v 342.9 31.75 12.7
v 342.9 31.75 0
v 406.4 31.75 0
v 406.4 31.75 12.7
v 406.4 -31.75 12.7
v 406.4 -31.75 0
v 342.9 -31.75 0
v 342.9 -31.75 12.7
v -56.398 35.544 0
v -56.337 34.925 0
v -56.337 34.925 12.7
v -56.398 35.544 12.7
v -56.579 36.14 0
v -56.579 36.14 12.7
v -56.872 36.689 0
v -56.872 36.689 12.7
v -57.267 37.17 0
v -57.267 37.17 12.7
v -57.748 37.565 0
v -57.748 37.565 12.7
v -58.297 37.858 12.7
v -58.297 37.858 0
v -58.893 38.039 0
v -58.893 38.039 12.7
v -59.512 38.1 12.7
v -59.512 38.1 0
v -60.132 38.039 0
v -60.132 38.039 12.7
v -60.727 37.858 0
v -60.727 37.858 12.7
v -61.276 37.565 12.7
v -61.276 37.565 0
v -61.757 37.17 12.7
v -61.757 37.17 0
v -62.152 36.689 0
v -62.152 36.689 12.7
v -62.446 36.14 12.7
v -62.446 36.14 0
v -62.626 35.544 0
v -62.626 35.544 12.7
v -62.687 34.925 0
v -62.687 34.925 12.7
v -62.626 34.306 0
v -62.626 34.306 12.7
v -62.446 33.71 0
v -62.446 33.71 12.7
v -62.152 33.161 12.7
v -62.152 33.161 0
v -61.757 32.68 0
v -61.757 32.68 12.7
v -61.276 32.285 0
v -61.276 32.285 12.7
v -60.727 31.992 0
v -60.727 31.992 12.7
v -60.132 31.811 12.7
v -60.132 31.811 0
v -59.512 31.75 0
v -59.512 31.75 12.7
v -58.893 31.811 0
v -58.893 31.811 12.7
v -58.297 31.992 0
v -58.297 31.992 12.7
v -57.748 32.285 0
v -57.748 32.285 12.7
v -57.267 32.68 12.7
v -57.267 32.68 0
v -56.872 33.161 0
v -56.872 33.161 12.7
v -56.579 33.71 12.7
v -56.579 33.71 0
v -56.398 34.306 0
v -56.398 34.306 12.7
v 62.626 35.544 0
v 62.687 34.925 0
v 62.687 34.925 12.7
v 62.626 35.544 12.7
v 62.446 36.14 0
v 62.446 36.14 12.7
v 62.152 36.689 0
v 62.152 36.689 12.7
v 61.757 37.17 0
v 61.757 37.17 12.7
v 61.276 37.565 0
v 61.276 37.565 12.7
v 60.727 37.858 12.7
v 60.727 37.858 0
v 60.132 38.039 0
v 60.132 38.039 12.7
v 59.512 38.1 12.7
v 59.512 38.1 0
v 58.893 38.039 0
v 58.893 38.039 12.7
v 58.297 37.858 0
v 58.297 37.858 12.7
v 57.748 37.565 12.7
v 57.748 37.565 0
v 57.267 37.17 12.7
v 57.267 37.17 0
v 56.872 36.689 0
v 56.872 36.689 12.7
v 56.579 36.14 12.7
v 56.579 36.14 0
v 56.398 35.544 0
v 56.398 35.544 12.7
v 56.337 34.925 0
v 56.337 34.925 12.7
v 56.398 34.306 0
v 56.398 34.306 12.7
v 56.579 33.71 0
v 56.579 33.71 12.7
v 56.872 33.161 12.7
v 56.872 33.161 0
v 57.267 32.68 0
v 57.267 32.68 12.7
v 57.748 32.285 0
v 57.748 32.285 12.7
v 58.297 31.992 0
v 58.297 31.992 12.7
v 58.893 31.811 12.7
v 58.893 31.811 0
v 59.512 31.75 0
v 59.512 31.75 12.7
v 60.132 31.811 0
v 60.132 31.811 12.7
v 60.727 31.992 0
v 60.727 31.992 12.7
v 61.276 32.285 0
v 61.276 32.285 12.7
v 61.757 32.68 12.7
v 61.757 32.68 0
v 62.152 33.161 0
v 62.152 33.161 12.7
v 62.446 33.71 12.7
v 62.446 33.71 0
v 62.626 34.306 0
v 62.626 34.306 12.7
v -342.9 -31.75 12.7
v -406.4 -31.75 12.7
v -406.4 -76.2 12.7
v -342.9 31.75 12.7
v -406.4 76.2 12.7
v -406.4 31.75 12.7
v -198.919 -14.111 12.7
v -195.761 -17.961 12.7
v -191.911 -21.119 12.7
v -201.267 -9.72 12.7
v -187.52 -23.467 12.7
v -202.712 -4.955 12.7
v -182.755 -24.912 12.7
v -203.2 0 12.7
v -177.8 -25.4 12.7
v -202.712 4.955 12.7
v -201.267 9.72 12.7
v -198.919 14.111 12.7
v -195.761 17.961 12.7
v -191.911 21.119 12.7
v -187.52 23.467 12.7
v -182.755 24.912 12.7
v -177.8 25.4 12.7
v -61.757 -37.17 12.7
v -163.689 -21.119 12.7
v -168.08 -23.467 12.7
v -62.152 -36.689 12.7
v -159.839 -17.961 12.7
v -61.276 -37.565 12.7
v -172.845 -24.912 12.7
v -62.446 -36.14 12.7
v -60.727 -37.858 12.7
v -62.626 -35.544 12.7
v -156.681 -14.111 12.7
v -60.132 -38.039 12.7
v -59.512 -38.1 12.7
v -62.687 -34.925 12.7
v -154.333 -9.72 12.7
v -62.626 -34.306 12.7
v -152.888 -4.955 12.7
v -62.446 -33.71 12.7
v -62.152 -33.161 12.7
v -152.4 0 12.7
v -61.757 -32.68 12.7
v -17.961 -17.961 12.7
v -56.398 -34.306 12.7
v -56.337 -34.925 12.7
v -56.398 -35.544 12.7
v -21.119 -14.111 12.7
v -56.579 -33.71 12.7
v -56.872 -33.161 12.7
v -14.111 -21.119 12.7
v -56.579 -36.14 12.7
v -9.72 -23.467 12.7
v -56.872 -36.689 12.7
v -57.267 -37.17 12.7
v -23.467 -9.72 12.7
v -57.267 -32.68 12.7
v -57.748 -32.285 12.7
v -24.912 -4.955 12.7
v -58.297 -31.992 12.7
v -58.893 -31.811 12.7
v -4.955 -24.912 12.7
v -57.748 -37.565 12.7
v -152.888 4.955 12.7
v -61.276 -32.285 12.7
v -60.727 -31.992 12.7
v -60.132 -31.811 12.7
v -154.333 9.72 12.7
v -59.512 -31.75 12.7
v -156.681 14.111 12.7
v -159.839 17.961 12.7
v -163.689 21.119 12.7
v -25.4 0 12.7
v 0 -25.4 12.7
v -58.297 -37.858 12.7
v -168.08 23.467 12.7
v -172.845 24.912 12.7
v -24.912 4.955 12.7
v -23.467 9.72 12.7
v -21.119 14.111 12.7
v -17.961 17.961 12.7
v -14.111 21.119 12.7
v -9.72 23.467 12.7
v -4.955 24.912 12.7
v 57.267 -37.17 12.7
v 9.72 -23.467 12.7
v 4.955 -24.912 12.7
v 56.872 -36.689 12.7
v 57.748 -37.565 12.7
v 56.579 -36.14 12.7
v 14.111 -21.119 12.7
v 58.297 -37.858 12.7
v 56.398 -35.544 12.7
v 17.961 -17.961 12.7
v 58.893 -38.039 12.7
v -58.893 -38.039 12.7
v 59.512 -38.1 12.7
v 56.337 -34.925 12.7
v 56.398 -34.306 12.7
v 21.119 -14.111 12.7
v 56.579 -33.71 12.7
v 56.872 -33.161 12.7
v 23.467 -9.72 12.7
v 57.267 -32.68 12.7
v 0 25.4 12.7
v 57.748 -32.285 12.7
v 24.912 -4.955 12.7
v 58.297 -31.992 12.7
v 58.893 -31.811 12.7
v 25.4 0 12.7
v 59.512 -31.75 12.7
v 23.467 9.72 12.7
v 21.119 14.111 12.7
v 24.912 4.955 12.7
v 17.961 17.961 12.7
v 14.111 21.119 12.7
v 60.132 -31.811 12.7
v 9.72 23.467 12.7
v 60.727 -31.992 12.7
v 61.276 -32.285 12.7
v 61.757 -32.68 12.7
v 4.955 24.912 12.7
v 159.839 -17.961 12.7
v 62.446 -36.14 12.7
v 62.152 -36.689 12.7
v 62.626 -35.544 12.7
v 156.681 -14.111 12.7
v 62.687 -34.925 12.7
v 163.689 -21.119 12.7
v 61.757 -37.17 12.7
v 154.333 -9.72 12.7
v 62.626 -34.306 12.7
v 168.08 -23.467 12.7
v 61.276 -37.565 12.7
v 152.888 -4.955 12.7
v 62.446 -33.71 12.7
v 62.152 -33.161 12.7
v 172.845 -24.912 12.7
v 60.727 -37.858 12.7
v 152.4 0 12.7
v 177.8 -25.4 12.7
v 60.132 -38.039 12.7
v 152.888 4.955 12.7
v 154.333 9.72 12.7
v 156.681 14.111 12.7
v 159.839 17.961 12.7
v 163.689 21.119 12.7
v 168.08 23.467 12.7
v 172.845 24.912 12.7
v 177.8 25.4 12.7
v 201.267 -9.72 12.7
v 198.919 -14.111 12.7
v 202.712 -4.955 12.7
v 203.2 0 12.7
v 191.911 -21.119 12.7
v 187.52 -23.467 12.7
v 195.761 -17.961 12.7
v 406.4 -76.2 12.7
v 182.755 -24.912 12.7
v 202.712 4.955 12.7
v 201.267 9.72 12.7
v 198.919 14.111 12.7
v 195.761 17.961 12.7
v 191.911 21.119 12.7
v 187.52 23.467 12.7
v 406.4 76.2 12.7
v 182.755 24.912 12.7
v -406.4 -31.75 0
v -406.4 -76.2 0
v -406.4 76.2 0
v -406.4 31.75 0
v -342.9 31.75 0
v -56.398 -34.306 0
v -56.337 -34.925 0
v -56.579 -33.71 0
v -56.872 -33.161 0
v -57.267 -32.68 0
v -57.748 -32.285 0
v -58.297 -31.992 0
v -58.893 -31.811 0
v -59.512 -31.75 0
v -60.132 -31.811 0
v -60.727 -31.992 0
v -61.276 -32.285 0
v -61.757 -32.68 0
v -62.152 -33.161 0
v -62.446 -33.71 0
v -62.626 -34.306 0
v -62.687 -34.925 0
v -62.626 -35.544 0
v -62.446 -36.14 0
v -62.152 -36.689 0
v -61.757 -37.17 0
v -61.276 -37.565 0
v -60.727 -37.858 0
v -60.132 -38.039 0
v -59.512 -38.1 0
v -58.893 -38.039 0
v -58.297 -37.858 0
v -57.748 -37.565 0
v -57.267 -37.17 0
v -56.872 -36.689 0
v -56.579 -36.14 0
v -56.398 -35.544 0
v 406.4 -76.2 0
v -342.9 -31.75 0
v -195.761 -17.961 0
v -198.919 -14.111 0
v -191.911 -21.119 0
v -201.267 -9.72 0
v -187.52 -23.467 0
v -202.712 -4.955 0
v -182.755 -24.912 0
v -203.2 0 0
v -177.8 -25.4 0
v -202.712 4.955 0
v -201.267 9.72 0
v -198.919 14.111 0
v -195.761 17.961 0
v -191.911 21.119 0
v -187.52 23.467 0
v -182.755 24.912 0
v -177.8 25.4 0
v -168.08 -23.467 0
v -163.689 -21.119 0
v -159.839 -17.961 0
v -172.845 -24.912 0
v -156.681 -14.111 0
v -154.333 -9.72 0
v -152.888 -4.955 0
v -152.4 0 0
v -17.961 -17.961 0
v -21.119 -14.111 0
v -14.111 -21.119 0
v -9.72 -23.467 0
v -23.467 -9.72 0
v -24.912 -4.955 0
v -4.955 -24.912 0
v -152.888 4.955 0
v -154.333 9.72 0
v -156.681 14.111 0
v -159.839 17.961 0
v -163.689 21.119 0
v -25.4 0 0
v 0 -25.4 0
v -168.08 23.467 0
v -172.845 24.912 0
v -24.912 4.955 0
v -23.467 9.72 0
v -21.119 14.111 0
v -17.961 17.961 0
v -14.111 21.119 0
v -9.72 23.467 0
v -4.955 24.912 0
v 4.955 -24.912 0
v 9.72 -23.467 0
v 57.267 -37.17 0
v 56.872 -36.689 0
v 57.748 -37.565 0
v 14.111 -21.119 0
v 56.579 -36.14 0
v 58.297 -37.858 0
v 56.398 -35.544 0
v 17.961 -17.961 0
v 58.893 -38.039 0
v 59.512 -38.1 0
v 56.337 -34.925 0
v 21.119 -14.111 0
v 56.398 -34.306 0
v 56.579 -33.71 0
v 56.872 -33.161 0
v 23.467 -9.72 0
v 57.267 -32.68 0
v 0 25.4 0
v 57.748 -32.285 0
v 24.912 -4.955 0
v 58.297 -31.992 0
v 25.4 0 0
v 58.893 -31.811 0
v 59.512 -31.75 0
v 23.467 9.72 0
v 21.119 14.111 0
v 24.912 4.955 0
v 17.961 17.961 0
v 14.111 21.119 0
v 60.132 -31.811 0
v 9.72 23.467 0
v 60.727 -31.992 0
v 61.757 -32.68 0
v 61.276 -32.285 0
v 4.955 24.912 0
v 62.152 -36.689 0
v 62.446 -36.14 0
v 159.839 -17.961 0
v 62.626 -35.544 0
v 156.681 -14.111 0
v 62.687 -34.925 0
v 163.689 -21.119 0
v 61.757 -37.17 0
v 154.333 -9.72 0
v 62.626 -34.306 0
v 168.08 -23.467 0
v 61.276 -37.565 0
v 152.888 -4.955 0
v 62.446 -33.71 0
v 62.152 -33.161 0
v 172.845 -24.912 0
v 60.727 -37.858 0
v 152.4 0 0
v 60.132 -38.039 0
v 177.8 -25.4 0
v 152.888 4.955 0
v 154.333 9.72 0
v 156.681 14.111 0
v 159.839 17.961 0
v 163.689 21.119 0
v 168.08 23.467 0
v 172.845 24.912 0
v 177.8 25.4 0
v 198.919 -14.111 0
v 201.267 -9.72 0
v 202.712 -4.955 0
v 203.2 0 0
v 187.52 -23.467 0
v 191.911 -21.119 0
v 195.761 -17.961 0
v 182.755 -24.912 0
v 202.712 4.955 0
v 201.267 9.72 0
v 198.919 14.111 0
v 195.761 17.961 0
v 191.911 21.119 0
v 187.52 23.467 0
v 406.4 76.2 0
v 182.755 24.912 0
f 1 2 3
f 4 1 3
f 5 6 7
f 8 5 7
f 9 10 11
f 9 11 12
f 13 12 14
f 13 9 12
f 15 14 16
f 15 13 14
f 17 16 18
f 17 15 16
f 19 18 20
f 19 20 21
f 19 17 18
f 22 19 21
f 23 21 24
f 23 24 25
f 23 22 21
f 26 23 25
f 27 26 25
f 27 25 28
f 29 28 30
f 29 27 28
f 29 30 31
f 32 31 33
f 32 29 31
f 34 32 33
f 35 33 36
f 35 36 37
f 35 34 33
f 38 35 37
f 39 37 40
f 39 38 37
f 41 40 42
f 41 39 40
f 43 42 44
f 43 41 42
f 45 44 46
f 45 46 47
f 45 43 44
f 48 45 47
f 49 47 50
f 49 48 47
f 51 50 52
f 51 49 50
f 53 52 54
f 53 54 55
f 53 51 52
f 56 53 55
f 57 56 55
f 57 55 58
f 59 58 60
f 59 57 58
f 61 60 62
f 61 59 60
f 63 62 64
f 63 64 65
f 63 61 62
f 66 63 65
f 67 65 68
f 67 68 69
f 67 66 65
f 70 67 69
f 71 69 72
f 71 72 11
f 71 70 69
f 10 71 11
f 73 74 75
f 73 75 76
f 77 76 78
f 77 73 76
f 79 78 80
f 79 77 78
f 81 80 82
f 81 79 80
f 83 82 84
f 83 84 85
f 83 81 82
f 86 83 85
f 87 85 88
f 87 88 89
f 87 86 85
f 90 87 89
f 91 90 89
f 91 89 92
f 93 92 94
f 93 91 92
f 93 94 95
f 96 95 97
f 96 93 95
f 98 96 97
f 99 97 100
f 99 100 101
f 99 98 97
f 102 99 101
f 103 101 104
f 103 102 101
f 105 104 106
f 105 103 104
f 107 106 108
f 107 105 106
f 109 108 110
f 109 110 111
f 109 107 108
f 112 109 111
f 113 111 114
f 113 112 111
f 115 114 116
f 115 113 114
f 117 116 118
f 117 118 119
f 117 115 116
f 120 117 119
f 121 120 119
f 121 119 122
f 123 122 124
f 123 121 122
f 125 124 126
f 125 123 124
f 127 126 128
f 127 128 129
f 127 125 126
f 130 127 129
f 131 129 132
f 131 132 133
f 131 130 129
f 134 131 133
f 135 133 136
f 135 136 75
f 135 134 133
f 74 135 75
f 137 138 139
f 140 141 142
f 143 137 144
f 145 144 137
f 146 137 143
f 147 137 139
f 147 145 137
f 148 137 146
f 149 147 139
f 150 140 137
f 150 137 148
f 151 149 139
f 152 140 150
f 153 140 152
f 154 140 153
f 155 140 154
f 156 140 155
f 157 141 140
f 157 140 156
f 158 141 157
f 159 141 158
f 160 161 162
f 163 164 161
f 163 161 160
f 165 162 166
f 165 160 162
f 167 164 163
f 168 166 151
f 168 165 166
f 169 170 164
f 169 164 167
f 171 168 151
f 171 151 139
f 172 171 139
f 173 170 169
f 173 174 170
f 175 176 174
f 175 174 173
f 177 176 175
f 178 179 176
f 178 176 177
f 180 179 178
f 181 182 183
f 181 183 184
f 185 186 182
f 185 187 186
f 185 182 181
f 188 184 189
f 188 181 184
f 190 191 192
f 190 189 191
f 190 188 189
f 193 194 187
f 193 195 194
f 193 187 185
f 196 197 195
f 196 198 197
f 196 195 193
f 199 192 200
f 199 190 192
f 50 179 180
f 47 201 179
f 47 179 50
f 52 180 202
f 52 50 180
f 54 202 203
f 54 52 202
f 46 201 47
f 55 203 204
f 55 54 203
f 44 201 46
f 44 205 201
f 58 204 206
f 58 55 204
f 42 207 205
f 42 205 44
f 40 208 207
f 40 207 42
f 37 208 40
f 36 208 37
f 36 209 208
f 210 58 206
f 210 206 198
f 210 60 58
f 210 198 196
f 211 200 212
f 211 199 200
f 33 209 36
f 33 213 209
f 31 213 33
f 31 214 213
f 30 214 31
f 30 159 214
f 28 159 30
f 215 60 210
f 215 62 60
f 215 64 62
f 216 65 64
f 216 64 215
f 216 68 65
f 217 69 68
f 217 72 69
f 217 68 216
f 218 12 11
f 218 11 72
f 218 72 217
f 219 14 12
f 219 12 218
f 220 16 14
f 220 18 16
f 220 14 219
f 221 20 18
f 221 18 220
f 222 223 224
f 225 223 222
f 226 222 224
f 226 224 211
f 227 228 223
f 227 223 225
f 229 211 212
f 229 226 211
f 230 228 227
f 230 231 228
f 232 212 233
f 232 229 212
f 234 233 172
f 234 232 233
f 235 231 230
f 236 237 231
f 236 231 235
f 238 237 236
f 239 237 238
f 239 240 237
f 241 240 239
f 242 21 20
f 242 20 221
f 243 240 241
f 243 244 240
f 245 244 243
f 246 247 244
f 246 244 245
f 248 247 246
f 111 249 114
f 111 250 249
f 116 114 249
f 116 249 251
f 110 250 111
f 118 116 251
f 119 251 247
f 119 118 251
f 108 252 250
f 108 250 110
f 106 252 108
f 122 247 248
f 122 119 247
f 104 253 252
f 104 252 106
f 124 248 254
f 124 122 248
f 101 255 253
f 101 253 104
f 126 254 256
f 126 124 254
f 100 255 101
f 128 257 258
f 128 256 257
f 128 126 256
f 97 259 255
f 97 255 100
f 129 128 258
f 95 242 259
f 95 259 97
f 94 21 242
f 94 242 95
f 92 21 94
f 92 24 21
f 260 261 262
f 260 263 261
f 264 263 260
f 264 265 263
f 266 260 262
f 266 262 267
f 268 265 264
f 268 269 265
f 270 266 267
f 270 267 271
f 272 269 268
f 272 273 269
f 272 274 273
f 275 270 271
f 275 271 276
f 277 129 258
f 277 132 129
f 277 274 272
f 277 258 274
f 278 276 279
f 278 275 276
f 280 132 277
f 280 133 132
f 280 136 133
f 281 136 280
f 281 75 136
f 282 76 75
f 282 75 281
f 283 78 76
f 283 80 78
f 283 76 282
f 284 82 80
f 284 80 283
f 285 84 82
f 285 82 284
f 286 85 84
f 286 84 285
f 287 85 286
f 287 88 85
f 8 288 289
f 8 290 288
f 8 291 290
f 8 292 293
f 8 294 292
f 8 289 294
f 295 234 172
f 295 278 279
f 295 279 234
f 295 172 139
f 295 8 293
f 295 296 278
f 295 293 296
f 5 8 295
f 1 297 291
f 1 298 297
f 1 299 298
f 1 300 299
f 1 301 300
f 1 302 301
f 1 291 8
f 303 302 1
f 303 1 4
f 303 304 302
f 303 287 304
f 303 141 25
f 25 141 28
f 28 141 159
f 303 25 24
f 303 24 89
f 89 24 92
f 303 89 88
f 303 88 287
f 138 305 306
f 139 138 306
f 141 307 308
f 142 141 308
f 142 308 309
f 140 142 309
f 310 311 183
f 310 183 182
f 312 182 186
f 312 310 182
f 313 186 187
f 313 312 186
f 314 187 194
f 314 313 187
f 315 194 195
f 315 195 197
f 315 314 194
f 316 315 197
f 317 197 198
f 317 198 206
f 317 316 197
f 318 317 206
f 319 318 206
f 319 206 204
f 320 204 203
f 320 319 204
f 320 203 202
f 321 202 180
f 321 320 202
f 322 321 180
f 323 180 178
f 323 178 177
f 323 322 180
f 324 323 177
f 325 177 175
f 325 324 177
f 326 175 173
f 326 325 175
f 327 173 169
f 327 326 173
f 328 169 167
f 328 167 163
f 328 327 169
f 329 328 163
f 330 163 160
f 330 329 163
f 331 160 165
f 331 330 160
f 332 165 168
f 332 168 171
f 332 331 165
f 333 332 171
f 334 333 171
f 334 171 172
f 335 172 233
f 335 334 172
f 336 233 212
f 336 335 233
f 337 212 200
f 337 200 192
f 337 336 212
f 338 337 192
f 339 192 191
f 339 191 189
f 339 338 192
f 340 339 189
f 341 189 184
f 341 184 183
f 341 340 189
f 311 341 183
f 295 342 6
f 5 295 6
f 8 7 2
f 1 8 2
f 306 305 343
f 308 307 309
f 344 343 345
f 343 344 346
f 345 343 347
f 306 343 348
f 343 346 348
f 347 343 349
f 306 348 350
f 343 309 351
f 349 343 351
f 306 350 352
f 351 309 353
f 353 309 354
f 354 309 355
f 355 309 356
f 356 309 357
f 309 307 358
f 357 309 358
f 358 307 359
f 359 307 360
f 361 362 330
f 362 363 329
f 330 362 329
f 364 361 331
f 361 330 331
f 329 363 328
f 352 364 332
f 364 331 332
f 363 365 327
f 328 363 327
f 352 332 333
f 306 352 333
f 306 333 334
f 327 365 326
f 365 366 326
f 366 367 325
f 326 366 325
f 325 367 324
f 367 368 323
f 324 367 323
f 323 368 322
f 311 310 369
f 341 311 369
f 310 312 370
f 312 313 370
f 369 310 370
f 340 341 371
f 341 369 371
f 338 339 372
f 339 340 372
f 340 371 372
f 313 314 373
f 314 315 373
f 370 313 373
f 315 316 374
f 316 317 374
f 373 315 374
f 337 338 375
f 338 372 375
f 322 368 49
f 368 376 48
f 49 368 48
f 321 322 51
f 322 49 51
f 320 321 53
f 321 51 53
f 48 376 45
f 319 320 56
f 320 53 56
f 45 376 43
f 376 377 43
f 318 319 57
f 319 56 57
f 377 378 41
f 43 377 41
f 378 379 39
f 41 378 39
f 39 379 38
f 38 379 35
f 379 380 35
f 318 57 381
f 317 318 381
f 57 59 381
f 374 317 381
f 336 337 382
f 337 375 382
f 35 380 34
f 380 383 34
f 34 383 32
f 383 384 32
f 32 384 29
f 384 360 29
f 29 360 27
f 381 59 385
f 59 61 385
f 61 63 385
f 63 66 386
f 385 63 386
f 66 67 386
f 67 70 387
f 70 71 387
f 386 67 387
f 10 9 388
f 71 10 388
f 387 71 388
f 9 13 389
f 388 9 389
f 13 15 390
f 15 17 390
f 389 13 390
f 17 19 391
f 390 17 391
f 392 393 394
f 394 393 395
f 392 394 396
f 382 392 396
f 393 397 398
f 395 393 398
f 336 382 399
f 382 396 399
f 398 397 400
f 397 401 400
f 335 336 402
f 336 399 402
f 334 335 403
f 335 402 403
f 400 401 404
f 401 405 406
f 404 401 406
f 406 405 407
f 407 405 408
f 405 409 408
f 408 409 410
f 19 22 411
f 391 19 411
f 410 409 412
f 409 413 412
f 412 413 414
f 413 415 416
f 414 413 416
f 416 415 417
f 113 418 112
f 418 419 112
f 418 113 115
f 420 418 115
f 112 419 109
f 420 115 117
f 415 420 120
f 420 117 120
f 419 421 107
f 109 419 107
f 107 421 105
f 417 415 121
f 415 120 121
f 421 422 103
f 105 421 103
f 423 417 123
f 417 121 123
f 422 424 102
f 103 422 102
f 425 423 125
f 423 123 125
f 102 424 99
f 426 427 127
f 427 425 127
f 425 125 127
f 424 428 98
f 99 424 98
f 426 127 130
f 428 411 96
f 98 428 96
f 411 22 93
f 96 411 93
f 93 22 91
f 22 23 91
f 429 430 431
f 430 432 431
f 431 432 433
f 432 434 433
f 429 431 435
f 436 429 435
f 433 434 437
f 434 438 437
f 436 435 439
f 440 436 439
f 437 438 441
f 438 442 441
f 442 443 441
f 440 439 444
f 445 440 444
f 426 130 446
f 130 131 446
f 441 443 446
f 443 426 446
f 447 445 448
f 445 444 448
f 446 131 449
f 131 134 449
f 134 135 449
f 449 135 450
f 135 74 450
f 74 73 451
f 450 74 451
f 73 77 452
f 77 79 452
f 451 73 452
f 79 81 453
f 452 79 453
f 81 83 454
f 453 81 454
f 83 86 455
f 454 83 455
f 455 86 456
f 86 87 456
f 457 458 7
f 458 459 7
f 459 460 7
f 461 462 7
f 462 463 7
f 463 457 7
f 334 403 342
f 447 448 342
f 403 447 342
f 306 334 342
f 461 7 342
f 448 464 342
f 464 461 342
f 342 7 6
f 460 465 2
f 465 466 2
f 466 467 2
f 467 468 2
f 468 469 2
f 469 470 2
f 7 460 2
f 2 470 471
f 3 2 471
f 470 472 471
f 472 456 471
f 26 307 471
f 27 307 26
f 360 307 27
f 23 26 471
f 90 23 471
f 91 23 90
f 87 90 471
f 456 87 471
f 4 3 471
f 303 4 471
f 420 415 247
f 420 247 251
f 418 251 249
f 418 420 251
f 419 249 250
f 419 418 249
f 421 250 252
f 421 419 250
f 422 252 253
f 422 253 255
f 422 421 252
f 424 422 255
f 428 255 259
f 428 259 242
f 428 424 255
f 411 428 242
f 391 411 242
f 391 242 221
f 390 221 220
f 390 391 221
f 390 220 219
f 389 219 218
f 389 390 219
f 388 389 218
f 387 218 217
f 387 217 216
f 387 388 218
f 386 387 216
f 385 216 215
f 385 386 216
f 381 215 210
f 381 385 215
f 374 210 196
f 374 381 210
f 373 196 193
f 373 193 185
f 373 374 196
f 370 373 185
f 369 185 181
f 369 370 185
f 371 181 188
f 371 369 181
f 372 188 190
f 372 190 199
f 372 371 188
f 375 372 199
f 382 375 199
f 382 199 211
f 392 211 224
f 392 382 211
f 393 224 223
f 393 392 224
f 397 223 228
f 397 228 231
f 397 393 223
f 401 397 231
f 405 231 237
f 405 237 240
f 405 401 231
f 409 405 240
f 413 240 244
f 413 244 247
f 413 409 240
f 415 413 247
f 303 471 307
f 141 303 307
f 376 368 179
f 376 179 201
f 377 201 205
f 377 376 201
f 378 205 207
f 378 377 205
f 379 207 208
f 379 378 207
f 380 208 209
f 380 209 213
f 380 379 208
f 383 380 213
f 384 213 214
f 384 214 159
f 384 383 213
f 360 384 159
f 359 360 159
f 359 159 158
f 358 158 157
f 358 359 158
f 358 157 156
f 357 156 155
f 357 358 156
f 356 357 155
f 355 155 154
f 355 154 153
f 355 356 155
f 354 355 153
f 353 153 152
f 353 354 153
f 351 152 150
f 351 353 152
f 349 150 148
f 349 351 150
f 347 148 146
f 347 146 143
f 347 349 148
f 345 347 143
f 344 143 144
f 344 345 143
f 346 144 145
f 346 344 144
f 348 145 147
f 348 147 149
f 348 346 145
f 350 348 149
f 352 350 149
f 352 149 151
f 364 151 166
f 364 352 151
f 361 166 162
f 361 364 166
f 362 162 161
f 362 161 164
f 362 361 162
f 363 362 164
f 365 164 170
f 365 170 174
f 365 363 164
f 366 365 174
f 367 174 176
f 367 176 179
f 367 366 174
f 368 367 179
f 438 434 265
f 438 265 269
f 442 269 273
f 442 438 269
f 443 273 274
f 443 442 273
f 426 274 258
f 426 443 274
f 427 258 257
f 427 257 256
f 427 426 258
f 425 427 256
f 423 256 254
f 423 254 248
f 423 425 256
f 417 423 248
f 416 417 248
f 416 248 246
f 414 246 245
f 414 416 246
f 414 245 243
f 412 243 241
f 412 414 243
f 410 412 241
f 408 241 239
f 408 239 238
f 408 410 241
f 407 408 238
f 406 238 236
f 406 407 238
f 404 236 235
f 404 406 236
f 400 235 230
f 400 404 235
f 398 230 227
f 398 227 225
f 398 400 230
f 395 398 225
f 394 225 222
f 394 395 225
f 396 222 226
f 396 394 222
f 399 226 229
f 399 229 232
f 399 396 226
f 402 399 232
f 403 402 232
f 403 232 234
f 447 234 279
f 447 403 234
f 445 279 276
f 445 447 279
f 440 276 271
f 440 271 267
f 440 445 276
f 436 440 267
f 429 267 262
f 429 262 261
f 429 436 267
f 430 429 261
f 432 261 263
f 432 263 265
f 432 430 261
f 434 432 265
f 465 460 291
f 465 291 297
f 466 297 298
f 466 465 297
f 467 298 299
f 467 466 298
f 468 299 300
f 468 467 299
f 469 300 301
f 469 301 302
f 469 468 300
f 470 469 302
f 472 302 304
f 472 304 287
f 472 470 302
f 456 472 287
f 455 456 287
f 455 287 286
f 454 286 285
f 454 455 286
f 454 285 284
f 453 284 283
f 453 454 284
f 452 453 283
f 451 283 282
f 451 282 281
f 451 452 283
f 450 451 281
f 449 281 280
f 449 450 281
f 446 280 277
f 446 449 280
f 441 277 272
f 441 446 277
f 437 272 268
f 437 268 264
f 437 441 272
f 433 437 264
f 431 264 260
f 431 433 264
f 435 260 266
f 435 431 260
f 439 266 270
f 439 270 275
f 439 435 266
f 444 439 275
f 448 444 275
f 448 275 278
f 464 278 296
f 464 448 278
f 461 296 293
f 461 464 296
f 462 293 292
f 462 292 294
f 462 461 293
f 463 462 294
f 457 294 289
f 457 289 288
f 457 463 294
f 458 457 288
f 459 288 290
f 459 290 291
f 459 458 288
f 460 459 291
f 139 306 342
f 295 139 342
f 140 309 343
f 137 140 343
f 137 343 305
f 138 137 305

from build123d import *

# Parameters (mm, degrees)
F0_R     = 3.175
F0_R_2   = 25.4
F1_DEPTH = 12.7


with BuildPart() as f1:
    # F0 (on Top) → F1 (new body)
    with BuildSketch(Plane.XY):
        Polygon((406.4, 76.2), (-406.4, 76.2), (-406.4, 31.75), (-342.9, 31.75), (-342.9, -31.75), (-406.4, -31.75), (-406.4, -76.2), (406.4, -76.2), (406.4, -31.75), (342.9, -31.75), (342.9, 31.75), (406.4, 31.75), align=None)
        with Locations((-59.5122, -34.925)):
            Circle(F0_R, mode=Mode.SUBTRACT)
        with Locations((59.5122, -34.925)):
            Circle(F0_R, mode=Mode.SUBTRACT)
        with Locations((-177.8, 0)):
            Circle(F0_R_2, mode=Mode.SUBTRACT)
        Circle(F0_R_2, mode=Mode.SUBTRACT)
        with Locations((-59.5122, 34.925)):
            Circle(F0_R, mode=Mode.SUBTRACT)
        with Locations((177.8, 0)):
            Circle(F0_R_2, mode=Mode.SUBTRACT)
        with Locations((59.5122, 34.925)):
            Circle(F0_R, mode=Mode.SUBTRACT)
    extrude(amount=F1_DEPTH)


solid = f1.part
